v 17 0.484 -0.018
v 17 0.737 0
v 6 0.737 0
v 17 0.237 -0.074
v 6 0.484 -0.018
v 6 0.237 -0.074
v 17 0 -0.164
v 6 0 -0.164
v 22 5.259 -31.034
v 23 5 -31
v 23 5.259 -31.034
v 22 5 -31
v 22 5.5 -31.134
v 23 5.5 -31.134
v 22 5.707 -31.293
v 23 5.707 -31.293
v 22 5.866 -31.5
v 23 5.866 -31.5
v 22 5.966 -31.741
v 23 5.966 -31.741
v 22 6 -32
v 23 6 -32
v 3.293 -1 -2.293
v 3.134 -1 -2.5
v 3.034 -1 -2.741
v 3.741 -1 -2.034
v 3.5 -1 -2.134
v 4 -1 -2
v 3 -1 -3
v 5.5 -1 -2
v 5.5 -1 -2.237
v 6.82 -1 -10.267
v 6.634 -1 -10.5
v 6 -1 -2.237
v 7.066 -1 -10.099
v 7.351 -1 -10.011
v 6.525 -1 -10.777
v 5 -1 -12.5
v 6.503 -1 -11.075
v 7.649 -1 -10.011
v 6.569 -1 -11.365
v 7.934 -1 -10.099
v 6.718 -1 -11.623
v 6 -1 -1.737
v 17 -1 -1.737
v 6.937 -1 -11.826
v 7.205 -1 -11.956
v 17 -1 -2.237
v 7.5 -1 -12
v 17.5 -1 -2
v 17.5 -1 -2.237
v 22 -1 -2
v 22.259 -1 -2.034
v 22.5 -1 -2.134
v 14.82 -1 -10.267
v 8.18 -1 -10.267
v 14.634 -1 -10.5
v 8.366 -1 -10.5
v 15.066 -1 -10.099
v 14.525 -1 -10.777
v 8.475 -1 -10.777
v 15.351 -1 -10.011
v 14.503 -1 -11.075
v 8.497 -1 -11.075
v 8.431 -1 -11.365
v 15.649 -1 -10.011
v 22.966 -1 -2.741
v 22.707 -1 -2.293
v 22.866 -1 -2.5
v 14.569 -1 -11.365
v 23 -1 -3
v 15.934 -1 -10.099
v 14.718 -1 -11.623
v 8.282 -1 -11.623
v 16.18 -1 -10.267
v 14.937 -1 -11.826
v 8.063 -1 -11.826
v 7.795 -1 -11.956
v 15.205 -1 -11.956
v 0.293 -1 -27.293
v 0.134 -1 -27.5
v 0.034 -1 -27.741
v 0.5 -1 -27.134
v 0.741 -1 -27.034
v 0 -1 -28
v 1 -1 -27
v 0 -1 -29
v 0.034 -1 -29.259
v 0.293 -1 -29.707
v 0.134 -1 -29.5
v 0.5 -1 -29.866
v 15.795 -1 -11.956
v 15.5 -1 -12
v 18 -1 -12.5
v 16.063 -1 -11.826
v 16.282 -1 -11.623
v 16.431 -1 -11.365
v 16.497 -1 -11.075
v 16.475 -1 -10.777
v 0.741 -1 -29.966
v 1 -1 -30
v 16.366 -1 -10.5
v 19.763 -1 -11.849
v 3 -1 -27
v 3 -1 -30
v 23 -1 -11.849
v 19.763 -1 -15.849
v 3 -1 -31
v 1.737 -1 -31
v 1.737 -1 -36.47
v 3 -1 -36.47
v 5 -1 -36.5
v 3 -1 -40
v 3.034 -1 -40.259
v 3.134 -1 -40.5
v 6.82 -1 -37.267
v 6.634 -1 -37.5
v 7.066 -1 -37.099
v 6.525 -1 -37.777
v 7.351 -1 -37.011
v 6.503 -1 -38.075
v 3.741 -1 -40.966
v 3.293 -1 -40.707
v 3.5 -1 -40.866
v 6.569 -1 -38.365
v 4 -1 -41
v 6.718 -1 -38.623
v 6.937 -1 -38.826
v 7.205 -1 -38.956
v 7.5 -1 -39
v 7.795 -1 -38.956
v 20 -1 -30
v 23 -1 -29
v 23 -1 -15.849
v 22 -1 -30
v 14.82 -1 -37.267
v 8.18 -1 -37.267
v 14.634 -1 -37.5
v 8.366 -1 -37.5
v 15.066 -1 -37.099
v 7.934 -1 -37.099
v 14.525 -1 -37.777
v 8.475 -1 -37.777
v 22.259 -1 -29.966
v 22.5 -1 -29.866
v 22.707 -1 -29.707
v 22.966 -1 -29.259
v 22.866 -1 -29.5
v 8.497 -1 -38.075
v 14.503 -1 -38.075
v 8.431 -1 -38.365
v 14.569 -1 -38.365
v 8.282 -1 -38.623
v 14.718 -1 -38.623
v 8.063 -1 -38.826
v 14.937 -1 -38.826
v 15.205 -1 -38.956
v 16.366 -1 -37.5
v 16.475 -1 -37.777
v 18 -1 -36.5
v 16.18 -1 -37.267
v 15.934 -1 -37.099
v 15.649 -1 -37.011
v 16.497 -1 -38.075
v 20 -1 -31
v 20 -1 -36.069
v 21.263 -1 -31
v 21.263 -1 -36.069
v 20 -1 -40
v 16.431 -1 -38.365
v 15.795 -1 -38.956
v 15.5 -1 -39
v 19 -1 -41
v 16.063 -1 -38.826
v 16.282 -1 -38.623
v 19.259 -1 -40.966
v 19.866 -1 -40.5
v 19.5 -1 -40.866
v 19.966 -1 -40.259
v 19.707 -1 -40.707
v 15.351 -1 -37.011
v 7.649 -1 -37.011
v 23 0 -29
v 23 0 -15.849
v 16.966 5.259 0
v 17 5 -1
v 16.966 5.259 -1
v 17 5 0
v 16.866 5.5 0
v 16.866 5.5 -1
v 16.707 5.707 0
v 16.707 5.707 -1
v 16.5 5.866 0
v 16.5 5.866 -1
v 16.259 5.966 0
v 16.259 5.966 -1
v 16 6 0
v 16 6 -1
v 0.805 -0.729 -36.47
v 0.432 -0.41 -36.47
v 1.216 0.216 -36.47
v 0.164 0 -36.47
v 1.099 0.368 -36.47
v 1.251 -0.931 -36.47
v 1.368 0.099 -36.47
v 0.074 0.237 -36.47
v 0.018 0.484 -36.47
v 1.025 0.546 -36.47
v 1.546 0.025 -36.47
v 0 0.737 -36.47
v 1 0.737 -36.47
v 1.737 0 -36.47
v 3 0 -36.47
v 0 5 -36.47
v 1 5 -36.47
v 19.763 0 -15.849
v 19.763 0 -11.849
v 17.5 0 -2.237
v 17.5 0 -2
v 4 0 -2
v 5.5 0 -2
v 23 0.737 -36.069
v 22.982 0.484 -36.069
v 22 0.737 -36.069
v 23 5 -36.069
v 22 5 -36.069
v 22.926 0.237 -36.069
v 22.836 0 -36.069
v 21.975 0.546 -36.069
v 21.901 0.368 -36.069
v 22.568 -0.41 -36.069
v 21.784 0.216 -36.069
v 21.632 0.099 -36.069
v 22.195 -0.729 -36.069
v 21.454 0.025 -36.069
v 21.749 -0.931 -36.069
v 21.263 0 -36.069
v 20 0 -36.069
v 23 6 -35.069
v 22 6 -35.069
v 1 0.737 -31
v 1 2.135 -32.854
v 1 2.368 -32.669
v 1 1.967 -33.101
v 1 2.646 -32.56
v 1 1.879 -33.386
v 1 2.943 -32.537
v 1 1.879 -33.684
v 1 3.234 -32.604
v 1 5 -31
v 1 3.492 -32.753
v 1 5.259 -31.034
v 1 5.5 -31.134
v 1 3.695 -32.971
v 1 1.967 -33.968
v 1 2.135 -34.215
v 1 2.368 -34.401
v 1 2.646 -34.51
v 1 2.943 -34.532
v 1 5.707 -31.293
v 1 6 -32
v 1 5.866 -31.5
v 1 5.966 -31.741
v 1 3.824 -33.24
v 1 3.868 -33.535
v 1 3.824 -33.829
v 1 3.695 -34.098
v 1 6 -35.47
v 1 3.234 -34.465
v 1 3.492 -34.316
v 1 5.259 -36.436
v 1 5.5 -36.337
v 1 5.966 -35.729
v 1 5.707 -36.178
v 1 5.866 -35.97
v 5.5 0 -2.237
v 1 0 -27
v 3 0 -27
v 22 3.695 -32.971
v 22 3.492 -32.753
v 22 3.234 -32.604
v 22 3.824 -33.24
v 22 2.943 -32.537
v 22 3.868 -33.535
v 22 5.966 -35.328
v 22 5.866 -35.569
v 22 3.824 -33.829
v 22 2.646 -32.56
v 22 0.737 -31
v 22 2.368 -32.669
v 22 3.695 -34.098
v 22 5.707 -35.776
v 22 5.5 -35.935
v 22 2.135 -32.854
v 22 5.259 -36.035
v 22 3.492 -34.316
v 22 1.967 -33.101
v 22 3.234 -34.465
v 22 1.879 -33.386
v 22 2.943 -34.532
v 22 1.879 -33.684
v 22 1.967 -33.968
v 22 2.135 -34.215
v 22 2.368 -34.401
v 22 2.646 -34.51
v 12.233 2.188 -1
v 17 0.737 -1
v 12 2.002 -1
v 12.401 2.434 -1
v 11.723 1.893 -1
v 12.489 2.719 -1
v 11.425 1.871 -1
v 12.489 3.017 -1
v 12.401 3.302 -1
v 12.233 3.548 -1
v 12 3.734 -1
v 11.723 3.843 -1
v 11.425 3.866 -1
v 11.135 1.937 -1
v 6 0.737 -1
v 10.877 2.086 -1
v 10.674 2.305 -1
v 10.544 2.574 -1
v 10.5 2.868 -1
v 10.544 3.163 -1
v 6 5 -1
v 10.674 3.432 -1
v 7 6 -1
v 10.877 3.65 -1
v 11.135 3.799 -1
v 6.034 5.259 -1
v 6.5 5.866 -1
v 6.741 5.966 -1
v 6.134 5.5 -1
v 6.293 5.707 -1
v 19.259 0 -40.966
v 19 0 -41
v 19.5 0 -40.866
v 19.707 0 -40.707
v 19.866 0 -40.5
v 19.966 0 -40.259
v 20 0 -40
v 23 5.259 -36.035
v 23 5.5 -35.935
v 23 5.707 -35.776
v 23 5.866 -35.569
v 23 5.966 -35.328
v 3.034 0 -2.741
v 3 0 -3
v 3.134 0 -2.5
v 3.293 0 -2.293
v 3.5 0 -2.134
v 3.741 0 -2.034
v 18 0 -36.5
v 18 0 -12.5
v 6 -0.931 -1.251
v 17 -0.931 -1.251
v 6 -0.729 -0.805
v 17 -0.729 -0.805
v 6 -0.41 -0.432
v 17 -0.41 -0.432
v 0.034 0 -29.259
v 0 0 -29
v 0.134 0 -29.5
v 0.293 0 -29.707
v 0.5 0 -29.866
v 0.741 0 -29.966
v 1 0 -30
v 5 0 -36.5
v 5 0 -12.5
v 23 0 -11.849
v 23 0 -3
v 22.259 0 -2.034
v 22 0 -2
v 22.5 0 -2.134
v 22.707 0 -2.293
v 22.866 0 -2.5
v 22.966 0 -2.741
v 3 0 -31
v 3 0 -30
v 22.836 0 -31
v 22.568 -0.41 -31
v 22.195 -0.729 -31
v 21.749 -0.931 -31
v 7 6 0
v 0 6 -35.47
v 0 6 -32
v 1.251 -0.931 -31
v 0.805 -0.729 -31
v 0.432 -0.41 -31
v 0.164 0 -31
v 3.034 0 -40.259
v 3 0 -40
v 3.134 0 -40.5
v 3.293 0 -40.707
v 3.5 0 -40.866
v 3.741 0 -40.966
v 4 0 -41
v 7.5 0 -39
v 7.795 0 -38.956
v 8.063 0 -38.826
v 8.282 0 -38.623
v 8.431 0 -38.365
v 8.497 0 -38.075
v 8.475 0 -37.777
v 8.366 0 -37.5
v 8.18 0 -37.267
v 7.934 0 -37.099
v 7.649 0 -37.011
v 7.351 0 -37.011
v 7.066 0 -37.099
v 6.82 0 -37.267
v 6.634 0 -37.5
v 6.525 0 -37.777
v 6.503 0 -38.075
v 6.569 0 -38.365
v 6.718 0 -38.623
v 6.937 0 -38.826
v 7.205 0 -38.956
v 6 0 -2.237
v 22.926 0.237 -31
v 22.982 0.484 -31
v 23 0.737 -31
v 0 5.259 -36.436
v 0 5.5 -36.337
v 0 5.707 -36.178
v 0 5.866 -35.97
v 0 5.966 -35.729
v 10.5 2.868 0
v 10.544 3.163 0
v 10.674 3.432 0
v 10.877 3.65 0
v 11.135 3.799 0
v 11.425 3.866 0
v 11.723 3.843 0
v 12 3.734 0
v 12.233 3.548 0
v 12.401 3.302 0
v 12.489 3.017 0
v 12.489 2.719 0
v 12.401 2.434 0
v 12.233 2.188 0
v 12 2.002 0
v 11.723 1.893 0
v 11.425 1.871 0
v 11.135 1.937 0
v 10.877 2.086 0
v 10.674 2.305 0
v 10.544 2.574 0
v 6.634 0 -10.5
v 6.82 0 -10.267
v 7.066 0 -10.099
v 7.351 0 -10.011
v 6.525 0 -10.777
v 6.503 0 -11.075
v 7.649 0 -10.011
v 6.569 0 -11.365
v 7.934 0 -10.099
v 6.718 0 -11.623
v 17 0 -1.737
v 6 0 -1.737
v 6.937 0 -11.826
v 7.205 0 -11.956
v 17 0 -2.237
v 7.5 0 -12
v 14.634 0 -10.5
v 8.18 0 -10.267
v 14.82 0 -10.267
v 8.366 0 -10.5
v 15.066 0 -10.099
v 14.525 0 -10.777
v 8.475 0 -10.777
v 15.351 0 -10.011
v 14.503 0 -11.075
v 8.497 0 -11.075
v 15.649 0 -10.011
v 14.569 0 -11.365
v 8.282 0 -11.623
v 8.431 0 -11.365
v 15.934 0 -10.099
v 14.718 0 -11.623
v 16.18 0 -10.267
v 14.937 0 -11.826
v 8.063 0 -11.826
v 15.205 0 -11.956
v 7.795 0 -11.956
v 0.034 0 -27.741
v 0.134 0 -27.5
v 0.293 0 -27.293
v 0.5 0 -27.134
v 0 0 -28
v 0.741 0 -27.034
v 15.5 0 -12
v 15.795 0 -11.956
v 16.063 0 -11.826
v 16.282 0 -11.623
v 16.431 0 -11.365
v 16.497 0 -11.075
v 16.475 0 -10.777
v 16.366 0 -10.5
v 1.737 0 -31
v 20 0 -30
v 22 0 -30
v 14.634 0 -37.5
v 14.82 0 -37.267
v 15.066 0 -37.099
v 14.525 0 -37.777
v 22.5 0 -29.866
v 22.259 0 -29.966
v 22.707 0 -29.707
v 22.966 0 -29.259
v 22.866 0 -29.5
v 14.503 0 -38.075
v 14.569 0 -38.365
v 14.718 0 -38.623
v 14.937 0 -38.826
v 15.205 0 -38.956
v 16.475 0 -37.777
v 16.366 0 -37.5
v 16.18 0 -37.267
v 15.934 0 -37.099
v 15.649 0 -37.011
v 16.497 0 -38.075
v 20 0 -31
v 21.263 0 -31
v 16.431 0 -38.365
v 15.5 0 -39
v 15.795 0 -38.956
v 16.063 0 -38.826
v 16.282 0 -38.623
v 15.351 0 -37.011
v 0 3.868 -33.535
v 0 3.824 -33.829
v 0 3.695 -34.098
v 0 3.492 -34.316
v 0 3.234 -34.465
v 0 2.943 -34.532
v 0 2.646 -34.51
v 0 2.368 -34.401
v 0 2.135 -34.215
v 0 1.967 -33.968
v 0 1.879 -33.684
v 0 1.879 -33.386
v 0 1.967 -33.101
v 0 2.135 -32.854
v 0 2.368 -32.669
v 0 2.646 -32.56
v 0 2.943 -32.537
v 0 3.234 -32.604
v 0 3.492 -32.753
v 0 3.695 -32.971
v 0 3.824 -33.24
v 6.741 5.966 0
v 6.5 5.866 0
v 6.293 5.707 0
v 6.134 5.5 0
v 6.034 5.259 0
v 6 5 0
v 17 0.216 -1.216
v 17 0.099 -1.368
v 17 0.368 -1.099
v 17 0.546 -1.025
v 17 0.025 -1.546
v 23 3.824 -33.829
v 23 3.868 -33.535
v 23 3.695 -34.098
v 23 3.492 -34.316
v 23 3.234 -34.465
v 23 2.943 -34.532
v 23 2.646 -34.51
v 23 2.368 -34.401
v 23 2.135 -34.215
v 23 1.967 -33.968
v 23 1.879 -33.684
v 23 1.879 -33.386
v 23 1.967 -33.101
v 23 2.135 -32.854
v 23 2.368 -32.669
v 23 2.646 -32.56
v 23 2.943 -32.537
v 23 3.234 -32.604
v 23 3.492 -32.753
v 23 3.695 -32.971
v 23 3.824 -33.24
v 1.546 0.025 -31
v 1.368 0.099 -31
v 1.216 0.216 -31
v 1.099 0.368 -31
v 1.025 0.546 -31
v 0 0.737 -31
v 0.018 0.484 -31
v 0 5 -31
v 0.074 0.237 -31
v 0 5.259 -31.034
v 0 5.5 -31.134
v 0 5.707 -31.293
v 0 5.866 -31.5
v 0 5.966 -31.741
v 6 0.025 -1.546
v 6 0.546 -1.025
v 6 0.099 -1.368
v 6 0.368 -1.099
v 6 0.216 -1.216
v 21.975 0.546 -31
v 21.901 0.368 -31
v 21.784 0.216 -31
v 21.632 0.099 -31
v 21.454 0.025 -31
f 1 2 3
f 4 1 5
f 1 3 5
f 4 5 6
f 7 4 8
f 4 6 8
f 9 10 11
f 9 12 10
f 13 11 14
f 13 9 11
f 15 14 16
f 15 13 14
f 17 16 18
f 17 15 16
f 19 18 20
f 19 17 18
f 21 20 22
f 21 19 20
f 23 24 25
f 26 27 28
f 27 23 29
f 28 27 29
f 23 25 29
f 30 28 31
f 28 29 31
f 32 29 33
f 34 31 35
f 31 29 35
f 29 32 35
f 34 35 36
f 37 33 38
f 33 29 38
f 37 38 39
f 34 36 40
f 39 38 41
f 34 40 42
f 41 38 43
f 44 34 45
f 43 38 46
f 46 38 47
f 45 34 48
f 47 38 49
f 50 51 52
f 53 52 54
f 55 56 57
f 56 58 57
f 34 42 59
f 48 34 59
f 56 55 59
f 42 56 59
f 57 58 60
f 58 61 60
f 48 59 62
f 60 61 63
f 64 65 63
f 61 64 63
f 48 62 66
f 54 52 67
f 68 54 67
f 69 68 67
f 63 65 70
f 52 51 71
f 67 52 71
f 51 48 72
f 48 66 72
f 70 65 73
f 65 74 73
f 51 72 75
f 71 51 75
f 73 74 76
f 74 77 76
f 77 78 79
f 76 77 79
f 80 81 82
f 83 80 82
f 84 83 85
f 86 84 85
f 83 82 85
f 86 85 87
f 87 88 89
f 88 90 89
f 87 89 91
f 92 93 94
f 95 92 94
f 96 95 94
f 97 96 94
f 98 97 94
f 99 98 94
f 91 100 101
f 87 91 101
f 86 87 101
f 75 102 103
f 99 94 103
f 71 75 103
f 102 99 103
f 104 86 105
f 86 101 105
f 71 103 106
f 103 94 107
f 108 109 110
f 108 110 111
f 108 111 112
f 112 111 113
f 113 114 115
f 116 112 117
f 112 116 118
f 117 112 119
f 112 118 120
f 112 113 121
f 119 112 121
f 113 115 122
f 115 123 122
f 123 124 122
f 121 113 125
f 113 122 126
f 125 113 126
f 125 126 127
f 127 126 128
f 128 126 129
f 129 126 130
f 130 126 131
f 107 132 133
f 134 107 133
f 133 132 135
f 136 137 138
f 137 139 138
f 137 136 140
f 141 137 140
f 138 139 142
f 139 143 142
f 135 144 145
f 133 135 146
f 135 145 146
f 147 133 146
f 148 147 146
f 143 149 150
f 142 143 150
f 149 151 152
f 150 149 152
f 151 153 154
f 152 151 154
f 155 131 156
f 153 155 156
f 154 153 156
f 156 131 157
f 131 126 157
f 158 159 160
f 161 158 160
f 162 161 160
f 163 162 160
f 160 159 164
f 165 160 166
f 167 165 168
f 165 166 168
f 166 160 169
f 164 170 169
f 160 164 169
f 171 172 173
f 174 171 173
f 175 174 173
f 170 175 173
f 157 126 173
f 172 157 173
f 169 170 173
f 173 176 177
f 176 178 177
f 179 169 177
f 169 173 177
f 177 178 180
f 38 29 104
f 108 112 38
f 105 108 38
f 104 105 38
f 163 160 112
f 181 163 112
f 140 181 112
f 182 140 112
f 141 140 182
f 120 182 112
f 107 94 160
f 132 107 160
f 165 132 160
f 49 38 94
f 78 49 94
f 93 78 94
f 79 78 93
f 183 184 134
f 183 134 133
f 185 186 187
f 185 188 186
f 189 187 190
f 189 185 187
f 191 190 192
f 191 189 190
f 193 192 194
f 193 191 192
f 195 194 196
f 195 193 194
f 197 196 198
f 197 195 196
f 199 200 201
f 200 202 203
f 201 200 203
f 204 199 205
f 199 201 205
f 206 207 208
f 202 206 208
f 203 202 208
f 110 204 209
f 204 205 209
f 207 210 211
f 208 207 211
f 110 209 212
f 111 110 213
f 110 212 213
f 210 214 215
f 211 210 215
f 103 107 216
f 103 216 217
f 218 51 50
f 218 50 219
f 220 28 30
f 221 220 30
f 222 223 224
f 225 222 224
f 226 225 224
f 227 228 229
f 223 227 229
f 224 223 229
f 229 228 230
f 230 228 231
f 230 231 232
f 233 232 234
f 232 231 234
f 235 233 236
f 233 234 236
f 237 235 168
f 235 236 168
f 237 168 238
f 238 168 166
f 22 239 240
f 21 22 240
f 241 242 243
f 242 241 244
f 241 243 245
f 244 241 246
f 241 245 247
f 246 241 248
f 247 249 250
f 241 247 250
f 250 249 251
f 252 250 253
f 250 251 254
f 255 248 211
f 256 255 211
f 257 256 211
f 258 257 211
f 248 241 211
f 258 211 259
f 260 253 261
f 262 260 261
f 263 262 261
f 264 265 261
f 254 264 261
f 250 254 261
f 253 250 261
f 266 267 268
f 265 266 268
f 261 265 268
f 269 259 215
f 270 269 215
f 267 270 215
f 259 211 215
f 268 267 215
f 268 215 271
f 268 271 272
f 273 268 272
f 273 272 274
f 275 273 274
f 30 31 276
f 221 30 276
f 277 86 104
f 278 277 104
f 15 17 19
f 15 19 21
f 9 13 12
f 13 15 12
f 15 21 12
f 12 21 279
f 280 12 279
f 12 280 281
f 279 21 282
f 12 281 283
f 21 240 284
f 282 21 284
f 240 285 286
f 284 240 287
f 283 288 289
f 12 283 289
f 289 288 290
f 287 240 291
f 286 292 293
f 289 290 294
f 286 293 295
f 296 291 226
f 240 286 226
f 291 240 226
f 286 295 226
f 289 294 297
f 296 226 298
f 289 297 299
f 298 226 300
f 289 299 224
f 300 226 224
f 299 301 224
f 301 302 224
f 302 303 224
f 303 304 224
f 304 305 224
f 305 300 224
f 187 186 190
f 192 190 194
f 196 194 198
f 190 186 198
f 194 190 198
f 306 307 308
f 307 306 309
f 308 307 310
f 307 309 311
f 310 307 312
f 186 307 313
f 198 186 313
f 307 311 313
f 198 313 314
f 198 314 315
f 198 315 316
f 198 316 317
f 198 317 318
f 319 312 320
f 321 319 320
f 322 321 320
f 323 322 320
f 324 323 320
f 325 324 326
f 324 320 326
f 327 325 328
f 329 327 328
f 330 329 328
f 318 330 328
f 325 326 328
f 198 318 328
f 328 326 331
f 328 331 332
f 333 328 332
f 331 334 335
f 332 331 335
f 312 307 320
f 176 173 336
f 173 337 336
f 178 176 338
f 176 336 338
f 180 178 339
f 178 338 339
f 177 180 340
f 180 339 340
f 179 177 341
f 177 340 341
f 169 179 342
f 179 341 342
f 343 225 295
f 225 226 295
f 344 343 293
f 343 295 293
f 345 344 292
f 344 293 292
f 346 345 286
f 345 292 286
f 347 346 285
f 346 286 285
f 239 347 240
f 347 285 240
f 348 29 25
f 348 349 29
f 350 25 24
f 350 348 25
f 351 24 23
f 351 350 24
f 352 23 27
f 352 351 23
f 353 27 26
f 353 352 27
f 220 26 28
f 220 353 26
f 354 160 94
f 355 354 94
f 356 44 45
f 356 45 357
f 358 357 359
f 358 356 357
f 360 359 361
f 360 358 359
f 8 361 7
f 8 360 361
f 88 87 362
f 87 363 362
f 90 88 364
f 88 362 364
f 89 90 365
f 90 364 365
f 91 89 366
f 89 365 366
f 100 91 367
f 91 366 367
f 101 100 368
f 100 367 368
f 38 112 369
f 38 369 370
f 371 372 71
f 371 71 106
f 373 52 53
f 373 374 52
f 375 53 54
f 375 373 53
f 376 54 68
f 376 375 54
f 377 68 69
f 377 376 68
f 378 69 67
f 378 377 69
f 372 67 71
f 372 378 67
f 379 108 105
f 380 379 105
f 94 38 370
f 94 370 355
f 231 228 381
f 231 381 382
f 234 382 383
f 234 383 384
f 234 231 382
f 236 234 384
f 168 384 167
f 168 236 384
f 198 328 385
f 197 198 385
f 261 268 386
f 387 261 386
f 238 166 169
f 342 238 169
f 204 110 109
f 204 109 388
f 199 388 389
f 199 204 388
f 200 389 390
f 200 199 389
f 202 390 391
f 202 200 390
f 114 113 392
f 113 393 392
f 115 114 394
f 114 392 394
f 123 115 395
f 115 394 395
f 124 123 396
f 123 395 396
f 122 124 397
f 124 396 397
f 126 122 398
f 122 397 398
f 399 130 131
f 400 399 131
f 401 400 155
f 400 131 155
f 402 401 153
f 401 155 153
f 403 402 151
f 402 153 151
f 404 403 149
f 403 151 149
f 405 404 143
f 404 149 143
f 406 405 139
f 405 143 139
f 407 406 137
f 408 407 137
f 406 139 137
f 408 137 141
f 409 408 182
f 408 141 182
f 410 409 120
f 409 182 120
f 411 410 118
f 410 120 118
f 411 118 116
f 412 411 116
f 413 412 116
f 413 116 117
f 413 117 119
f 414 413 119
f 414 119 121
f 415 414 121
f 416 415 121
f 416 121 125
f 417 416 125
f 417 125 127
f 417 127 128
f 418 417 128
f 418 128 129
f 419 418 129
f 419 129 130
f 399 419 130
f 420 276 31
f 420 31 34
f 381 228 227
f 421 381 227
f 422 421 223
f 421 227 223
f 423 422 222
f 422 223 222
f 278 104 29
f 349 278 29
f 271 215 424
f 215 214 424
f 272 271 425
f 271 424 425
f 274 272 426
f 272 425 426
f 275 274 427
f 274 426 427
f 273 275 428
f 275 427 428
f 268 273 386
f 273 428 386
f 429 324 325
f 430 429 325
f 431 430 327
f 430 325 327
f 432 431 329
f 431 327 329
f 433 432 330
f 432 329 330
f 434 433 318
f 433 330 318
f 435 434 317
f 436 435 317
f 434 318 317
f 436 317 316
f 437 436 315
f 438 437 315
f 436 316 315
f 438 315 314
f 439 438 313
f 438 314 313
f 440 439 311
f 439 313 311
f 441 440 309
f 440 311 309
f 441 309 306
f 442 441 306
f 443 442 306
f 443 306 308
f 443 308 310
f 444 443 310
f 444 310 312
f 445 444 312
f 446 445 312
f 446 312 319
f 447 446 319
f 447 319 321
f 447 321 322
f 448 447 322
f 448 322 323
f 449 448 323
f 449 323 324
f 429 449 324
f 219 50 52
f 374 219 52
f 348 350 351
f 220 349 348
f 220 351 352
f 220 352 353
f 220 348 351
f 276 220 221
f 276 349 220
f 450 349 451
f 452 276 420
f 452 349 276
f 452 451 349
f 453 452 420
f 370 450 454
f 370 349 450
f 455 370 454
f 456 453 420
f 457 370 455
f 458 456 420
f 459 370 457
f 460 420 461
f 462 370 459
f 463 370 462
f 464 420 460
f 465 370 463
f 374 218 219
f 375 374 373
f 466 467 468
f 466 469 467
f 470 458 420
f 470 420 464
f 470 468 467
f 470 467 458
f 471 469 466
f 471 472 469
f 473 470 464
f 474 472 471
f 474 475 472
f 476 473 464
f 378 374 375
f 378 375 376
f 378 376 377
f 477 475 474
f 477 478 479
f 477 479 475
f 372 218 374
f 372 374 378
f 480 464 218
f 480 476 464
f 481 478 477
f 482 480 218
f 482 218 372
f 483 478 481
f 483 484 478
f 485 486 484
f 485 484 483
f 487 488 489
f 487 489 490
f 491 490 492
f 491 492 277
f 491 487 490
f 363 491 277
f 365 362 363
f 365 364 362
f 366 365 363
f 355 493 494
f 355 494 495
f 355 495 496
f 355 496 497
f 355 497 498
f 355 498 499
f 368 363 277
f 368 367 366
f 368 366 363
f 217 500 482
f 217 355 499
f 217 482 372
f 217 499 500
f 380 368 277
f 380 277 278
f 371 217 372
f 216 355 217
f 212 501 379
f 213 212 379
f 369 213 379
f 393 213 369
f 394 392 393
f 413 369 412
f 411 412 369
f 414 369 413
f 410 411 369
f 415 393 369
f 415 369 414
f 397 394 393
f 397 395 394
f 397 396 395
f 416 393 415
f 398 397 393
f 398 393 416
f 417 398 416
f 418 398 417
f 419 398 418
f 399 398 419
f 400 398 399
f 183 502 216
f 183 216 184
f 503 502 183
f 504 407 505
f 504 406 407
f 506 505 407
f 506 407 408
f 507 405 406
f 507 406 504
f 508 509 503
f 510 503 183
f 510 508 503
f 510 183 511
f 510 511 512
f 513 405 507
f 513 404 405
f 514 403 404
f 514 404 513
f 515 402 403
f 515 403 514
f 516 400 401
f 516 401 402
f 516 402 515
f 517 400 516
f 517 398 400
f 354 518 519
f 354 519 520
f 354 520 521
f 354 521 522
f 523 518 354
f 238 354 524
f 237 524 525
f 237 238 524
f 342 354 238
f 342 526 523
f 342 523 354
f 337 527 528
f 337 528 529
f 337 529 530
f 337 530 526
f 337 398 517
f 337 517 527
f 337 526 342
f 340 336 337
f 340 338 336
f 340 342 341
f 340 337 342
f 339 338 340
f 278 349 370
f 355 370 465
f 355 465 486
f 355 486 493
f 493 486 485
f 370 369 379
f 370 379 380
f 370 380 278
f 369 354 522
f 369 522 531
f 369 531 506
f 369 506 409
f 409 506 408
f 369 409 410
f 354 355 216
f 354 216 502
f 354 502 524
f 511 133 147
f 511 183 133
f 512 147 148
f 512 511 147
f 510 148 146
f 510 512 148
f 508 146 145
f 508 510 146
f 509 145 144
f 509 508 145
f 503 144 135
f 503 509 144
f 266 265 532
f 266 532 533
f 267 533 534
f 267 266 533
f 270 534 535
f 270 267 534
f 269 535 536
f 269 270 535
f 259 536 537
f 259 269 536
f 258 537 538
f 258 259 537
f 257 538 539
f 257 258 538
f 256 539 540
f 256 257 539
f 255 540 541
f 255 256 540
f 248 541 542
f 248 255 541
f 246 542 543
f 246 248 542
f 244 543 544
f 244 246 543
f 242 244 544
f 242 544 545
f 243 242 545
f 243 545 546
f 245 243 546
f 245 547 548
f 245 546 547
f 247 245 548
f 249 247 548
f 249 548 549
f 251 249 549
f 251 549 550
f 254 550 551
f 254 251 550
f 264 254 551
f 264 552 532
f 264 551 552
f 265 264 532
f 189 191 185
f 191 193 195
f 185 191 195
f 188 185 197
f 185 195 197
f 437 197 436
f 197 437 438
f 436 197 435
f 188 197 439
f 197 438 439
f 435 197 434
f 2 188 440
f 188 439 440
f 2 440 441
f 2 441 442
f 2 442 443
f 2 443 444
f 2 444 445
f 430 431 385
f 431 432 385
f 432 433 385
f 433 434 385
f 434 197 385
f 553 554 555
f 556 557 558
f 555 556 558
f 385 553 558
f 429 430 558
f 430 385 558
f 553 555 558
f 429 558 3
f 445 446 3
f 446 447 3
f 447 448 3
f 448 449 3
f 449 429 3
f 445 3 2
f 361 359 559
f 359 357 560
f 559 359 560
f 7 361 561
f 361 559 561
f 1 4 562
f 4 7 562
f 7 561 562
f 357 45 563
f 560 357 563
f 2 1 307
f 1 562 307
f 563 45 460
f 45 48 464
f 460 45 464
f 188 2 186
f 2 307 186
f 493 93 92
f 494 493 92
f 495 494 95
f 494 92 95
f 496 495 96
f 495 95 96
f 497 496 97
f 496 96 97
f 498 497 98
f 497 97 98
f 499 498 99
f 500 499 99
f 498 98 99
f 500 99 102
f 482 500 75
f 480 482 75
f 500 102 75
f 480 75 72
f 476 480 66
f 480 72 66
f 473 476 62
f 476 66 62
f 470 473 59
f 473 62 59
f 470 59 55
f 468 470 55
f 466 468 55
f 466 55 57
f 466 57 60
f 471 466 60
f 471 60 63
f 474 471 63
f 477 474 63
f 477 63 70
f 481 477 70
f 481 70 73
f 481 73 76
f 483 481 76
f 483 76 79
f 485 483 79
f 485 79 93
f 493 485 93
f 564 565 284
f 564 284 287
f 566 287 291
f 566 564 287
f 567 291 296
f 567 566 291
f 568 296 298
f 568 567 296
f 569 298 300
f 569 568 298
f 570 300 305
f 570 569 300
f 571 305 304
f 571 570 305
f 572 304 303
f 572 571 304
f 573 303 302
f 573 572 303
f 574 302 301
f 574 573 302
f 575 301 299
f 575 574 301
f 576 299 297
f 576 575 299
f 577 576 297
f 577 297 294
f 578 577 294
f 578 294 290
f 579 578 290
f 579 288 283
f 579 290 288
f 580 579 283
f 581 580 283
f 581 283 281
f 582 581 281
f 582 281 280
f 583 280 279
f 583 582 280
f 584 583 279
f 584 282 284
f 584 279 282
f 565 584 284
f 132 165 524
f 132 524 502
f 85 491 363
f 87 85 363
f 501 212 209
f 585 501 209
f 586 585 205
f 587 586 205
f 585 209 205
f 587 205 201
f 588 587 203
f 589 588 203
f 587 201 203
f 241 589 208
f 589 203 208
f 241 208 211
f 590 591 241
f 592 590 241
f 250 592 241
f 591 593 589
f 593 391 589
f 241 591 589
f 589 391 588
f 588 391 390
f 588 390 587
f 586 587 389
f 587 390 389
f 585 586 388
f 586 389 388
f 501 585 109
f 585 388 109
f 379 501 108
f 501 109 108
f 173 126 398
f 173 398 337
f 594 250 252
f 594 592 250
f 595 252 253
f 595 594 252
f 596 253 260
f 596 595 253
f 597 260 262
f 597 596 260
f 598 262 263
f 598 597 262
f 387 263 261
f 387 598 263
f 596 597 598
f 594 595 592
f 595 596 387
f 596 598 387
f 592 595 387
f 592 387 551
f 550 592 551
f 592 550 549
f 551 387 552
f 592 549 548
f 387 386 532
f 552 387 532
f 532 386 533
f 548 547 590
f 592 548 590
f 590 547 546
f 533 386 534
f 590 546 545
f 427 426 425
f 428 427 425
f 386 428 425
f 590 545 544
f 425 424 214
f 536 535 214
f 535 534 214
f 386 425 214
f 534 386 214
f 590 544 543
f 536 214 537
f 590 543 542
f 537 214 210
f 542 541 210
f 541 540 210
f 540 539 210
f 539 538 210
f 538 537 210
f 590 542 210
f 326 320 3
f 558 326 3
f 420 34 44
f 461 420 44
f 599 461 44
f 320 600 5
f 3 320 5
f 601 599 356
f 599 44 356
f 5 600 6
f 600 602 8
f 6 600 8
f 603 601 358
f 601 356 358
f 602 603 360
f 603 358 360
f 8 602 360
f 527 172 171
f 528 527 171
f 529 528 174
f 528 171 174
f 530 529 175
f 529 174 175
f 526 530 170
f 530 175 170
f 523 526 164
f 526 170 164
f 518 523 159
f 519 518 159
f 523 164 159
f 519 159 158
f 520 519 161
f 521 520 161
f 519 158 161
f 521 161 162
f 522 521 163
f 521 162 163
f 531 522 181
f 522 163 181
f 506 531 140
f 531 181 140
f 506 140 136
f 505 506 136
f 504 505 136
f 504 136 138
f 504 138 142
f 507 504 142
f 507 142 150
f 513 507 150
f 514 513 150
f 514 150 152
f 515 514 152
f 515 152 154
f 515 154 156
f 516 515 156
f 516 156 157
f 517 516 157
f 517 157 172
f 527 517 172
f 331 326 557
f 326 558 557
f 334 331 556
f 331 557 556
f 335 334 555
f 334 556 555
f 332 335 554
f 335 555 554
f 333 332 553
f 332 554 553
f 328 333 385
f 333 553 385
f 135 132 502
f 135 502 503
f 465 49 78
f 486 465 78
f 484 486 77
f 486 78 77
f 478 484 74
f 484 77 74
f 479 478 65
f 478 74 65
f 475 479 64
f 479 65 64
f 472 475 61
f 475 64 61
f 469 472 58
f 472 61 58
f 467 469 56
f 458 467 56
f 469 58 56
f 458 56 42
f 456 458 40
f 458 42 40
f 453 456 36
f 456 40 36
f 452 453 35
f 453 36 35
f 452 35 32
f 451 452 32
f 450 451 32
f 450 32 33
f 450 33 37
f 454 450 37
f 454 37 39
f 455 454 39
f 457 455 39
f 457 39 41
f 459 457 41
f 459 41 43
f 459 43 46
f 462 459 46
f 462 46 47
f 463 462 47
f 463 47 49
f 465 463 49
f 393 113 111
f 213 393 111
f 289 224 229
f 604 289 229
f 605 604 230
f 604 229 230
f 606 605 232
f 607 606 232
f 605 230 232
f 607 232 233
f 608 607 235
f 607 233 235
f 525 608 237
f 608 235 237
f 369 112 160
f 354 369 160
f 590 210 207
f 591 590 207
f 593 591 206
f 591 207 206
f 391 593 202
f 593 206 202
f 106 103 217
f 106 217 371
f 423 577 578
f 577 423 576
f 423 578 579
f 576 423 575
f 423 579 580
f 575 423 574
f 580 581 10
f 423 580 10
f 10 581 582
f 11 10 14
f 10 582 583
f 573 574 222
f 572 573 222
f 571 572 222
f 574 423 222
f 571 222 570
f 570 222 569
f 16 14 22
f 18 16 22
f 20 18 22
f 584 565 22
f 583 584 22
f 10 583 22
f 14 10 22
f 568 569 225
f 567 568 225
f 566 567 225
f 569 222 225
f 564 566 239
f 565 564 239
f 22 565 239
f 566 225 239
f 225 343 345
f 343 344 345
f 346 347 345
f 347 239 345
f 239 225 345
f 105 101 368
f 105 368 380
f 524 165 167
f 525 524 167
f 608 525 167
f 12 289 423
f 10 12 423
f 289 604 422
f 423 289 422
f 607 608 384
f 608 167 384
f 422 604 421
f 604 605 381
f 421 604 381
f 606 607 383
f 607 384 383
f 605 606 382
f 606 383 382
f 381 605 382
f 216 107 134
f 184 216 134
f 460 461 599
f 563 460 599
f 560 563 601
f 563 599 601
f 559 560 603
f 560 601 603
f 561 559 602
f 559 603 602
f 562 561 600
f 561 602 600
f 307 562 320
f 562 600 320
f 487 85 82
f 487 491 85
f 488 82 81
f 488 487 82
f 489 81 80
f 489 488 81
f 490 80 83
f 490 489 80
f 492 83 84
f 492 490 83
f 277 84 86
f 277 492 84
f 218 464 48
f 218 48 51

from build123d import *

# Parameters (mm, degrees)
SKETCH1_W                = 23
SKETCH1_H                = 50
BASE_FLANGE1_DEPTH       = 1
SKETCH8_W                = 13
SKETCH8_H                = 24
CUT_EXTRUDE2_DEPTH       = 56.045435778
SKETCH9_W                = 17
SKETCH9_H                = 9
SKETCH9_W_2              = 3
SKETCH9_H_2              = 1
SKETCH9_H_3              = 25
SKETCH9_W_3              = 6
SKETCH9_H_4              = 2
CUT_EXTRUDE3_DEPTH       = 56.045435778
EDGE_FLANGE1_START       = -36.069185562
EDGE_FLANGE1_DEPTH       = 5.069185562
EDGE_FLANGE1_START_2     = -36.470498128
EDGE_FLANGE1_2_DEPTH     = 0.401312566
EDGE_FLANGE1_START_3     = 6
EDGE_FLANGE1_3_DEPTH     = 11
EDGE_FLANGE1_4_DEPTH     = 5.470498128
EDGE_FLANGE1_START_4     = -2.2366
EDGE_FLANGE1_5_OUTLINE_W = 0.5
EDGE_FLANGE1_5_OUTLINE_H = 1
EDGE_FLANGE1_5_DEPTH     = 0.2366
EDGE_FLANGE1_6_DEPTH     = 11
FILLET1_R                = 1
SKETCH19_W               = 4.427639712
SKETCH19_H               = 4
CUT_EXTRUDE4_DEPTH       = 48.528938553
SKETCH20_R               = 1
CUT_EXTRUDE5_DEPTH       = 48.528938553
SKETCH21_R               = 1
CUT_EXTRUDE6_DEPTH       = 10
CUT_EXTRUDE7_DEPTH       = 47.914816423
CUT_EXTRUDE7_DEPTH_BACK  = 10
SKETCH22_R               = 1
FILLET2_R                = 1


# Read off the part's stored shape, not the designer's step: Edge-Flange1
# Sheet-metal steps are written as plain solids
with BuildPart() as part:
    # Sketch1 → Base-Flange1 (new body)
    with BuildSketch(Plane(origin=(0, 0, 0), x_dir=(1, 0, 0), z_dir=(0, 1, 0))):
        with Locations((11.5, 25)):
            Rectangle(SKETCH1_W, SKETCH1_H)
    extrude(amount=-BASE_FLANGE1_DEPTH)

    # Sketch8 → Cut-Extrude2 (cut, through all)
    with BuildSketch(Plane.XZ.offset(1)):
        with Locations((11.5, -24.5)):
            Rectangle(SKETCH8_W, SKETCH8_H)
    extrude(amount=-CUT_EXTRUDE2_DEPTH, mode=Mode.SUBTRACT)

    # Sketch9 → Cut-Extrude3 (cut, through all)
    with BuildSketch(Plane.XZ.offset(1)):
        with Locations((11.5, -45.5)):
            Rectangle(SKETCH9_W, SKETCH9_H)
        Polygon((0, -50), (3, -50), (3, -41), (3, -36.470498128), (0, -36.470498128), align=None)
        Polygon((23, -50), (23, -36.069185562), (20, -36.069185562), (20, -41), (20, -50), align=None)
        with Locations((21.5, -30.5)):
            Rectangle(SKETCH9_W_2, SKETCH9_H_2)
        with Locations((1.5, -30.5)):
            Rectangle(SKETCH9_W_2, SKETCH9_H_2)
        with Locations((1.5, -14.5)):
            Rectangle(SKETCH9_W_2, SKETCH9_H_3)
        with Locations((20, -1)):
            Rectangle(SKETCH9_W_3, SKETCH9_H_4)
        with Locations((4.5, -1)):
            Rectangle(SKETCH9_W_2, SKETCH9_H_4)
        with Locations((1.5, -1)):
            Rectangle(SKETCH9_W_2, SKETCH9_H_4)
    extrude(amount=-CUT_EXTRUDE3_DEPTH, mode=Mode.SUBTRACT)

    # Edge-Flange1 outline → Edge-Flange1 (add)
    with BuildSketch(Plane.XY.offset(EDGE_FLANGE1_START)):
        with BuildLine():
            Line((23, 0.7366), (23, 6))
            Line((23, 6), (22, 6))
            Line((22, 6), (22, 0.7366))
            ThreePointArc((22, 0.7366), (21.784254855, 0.215745145), (21.2634, 0))
            Line((21.2634, 0), (22.83604109, 0))
            ThreePointArc((22.83604109, 0), (22.958514757, 0.359286442), (23, 0.7366))
        make_face()
        with BuildLine():
            Line((0.16395891, 0), (1.7366, 0))
            ThreePointArc((1.7366, 0), (1.215745145, 0.215745145), (1, 0.7366))
            Line((1, 0.7366), (1, 6))
            Line((1, 6), (0, 6))
            Line((0, 6), (0, 0.7366))
            ThreePointArc((0, 0.7366), (0.041485243, 0.359286442), (0.16395891, 0))
        make_face()
    extrude(amount=EDGE_FLANGE1_DEPTH)

    # Edge-Flange1 2 outline → Edge-Flange1 2 (add)
    with BuildSketch(Plane.XY.offset(EDGE_FLANGE1_START_2)):
        with BuildLine():
            Line((0.16395891, 0), (1.7366, 0))
            ThreePointArc((1.7366, 0), (1.215745145, 0.215745145), (1, 0.7366))
            Line((1, 0.7366), (1, 6))
            Line((1, 6), (0, 6))
            Line((0, 6), (0, 0.7366))
            ThreePointArc((0, 0.7366), (0.041485243, 0.359286442), (0.16395891, 0))
        make_face()
    extrude(amount=EDGE_FLANGE1_2_DEPTH)

    # Edge-Flange1 3 outline → Edge-Flange1 3 (add)
    with BuildSketch(Plane.YZ.offset(EDGE_FLANGE1_START_3)):
        with BuildLine():
            Line((6, 0), (0.7366, 0))
            ThreePointArc((0.7366, 0), (0.359286442, -0.041485243), (0, -0.16395891))
            Line((0, -0.16395891), (0, -1.7366))
            ThreePointArc((0, -1.7366), (0.215745145, -1.215745145), (0.7366, -1))
            Line((0.7366, -1), (6, -1))
            Line((6, -1), (6, 0))
        make_face()
    extrude(amount=EDGE_FLANGE1_3_DEPTH)

    # Edge-Flange1 4 outline → Edge-Flange1 4 (cut)
    with BuildSketch(Plane.XY.offset(EDGE_FLANGE1_START_2)):
        with BuildLine():
            Line((23, 0), (22.83604109, 0))
            ThreePointArc((22.83604109, 0), (22.195226164, -0.728828115), (21.2634, -1))
            Line((21.2634, -1), (23, -1))
            Line((23, -1), (23, 0))
        make_face()
        with BuildLine():
            Line((0, -1), (1.7366, -1))
            ThreePointArc((1.7366, -1), (0.804773836, -0.728828115), (0.16395891, 0))
            Line((0.16395891, 0), (0, 0))
            Line((0, 0), (0, -1))
        make_face()
    extrude(amount=EDGE_FLANGE1_4_DEPTH, mode=Mode.SUBTRACT)

    # Edge-Flange1 5 outline → Edge-Flange1 5 (cut)
    with BuildSketch(Plane.XY.offset(EDGE_FLANGE1_START_4)):
        with Locations((17.25, -0.5)):
            Rectangle(EDGE_FLANGE1_5_OUTLINE_W, EDGE_FLANGE1_5_OUTLINE_H)
        with Locations((5.75, -0.5)):
            Rectangle(EDGE_FLANGE1_5_OUTLINE_W, EDGE_FLANGE1_5_OUTLINE_H)
    extrude(amount=EDGE_FLANGE1_5_DEPTH, mode=Mode.SUBTRACT)

    # Edge-Flange1 6 outline → Edge-Flange1 6 (cut)
    with BuildSketch(Plane.YZ.offset(EDGE_FLANGE1_START_3)):
        with BuildLine():
            ThreePointArc((-1, -1.7366), (-0.728828115, -0.804773836), (0, -0.16395891))
            Line((0, -0.16395891), (0, 0))
            Line((0, 0), (-1, 0))
            Line((-1, 0), (-1, -1.7366))
        make_face()
    extrude(amount=EDGE_FLANGE1_6_DEPTH, mode=Mode.SUBTRACT)

    # Fillet1
    fillet1_edges = [part.edges().sort_by_distance(p)[0] for p in [
        (3, -0.5, -2),
        (0, -0.5, -27),
        (6, 6, -0.5),
        (17, 6, -0.5),
        (0.5, 6, -36.470498128),
        (0.5, 6, -31),
        (22.5, 6, -31),
        (22.5, 6, -36.069185562),
        (23, -0.5, -30),
        (0, -0.5, -30),
        (23, -0.5, -2),
    ]]
    fillet(fillet1_edges, radius=FILLET1_R)

    # Sketch19 → Cut-Extrude4 (cut, through all)
    with BuildSketch(Plane.XZ.offset(1)):
        with Locations((21.977182604, -13.849068818)):
            Rectangle(SKETCH19_W, SKETCH19_H)
    extrude(amount=-CUT_EXTRUDE4_DEPTH, mode=Mode.SUBTRACT)

    # Sketch20 → Cut-Extrude5 (cut, through all)
    with BuildSketch(Plane.XZ.offset(1)):
        with Locations(Location((7.5, -11, 0), (0, 0, 270))):
            Circle(SKETCH20_R)
        with Locations(Location((15.5, -11, 0), (0, 0, 270))):
            Circle(SKETCH20_R)
        with Locations(Location((7.5, -38, 0), (0, 0, 270))):
            Circle(SKETCH20_R)
        with Locations(Location((15.5, -38, 0), (0, 0, 270))):
            Circle(SKETCH20_R)
    extrude(amount=-CUT_EXTRUDE5_DEPTH, mode=Mode.SUBTRACT)

    # Sketch21 → Cut-Extrude6 (cut)
    with BuildSketch(Plane(origin=(0, 0, -1), x_dir=(-1, 0, 0), z_dir=(0, 0, -1))):
        with Locations((-11.5, 2.8683)):
            Circle(SKETCH21_R)
    extrude(amount=-CUT_EXTRUDE6_DEPTH, mode=Mode.SUBTRACT)

    # Sketch22 → Cut-Extrude7 (cut, two sides: drawn at the far end of the back side and taken through both)
    with BuildSketch(Plane.ZY.offset(-22).offset(-CUT_EXTRUDE7_DEPTH_BACK)):
        with Locations(Location((-33.534592781, 2.8683, 0), (0, 0, 90))):
            Circle(SKETCH22_R)
    extrude(amount=CUT_EXTRUDE7_DEPTH + CUT_EXTRUDE7_DEPTH_BACK, mode=Mode.SUBTRACT)

    # Fillet2
    fillet2_edges = [part.edges().sort_by_distance(p)[0] for p in [
        (3, -0.5, -41),
        (20, -0.5, -41),
    ]]
    fillet(fillet2_edges, radius=FILLET2_R)


solid = part.part
